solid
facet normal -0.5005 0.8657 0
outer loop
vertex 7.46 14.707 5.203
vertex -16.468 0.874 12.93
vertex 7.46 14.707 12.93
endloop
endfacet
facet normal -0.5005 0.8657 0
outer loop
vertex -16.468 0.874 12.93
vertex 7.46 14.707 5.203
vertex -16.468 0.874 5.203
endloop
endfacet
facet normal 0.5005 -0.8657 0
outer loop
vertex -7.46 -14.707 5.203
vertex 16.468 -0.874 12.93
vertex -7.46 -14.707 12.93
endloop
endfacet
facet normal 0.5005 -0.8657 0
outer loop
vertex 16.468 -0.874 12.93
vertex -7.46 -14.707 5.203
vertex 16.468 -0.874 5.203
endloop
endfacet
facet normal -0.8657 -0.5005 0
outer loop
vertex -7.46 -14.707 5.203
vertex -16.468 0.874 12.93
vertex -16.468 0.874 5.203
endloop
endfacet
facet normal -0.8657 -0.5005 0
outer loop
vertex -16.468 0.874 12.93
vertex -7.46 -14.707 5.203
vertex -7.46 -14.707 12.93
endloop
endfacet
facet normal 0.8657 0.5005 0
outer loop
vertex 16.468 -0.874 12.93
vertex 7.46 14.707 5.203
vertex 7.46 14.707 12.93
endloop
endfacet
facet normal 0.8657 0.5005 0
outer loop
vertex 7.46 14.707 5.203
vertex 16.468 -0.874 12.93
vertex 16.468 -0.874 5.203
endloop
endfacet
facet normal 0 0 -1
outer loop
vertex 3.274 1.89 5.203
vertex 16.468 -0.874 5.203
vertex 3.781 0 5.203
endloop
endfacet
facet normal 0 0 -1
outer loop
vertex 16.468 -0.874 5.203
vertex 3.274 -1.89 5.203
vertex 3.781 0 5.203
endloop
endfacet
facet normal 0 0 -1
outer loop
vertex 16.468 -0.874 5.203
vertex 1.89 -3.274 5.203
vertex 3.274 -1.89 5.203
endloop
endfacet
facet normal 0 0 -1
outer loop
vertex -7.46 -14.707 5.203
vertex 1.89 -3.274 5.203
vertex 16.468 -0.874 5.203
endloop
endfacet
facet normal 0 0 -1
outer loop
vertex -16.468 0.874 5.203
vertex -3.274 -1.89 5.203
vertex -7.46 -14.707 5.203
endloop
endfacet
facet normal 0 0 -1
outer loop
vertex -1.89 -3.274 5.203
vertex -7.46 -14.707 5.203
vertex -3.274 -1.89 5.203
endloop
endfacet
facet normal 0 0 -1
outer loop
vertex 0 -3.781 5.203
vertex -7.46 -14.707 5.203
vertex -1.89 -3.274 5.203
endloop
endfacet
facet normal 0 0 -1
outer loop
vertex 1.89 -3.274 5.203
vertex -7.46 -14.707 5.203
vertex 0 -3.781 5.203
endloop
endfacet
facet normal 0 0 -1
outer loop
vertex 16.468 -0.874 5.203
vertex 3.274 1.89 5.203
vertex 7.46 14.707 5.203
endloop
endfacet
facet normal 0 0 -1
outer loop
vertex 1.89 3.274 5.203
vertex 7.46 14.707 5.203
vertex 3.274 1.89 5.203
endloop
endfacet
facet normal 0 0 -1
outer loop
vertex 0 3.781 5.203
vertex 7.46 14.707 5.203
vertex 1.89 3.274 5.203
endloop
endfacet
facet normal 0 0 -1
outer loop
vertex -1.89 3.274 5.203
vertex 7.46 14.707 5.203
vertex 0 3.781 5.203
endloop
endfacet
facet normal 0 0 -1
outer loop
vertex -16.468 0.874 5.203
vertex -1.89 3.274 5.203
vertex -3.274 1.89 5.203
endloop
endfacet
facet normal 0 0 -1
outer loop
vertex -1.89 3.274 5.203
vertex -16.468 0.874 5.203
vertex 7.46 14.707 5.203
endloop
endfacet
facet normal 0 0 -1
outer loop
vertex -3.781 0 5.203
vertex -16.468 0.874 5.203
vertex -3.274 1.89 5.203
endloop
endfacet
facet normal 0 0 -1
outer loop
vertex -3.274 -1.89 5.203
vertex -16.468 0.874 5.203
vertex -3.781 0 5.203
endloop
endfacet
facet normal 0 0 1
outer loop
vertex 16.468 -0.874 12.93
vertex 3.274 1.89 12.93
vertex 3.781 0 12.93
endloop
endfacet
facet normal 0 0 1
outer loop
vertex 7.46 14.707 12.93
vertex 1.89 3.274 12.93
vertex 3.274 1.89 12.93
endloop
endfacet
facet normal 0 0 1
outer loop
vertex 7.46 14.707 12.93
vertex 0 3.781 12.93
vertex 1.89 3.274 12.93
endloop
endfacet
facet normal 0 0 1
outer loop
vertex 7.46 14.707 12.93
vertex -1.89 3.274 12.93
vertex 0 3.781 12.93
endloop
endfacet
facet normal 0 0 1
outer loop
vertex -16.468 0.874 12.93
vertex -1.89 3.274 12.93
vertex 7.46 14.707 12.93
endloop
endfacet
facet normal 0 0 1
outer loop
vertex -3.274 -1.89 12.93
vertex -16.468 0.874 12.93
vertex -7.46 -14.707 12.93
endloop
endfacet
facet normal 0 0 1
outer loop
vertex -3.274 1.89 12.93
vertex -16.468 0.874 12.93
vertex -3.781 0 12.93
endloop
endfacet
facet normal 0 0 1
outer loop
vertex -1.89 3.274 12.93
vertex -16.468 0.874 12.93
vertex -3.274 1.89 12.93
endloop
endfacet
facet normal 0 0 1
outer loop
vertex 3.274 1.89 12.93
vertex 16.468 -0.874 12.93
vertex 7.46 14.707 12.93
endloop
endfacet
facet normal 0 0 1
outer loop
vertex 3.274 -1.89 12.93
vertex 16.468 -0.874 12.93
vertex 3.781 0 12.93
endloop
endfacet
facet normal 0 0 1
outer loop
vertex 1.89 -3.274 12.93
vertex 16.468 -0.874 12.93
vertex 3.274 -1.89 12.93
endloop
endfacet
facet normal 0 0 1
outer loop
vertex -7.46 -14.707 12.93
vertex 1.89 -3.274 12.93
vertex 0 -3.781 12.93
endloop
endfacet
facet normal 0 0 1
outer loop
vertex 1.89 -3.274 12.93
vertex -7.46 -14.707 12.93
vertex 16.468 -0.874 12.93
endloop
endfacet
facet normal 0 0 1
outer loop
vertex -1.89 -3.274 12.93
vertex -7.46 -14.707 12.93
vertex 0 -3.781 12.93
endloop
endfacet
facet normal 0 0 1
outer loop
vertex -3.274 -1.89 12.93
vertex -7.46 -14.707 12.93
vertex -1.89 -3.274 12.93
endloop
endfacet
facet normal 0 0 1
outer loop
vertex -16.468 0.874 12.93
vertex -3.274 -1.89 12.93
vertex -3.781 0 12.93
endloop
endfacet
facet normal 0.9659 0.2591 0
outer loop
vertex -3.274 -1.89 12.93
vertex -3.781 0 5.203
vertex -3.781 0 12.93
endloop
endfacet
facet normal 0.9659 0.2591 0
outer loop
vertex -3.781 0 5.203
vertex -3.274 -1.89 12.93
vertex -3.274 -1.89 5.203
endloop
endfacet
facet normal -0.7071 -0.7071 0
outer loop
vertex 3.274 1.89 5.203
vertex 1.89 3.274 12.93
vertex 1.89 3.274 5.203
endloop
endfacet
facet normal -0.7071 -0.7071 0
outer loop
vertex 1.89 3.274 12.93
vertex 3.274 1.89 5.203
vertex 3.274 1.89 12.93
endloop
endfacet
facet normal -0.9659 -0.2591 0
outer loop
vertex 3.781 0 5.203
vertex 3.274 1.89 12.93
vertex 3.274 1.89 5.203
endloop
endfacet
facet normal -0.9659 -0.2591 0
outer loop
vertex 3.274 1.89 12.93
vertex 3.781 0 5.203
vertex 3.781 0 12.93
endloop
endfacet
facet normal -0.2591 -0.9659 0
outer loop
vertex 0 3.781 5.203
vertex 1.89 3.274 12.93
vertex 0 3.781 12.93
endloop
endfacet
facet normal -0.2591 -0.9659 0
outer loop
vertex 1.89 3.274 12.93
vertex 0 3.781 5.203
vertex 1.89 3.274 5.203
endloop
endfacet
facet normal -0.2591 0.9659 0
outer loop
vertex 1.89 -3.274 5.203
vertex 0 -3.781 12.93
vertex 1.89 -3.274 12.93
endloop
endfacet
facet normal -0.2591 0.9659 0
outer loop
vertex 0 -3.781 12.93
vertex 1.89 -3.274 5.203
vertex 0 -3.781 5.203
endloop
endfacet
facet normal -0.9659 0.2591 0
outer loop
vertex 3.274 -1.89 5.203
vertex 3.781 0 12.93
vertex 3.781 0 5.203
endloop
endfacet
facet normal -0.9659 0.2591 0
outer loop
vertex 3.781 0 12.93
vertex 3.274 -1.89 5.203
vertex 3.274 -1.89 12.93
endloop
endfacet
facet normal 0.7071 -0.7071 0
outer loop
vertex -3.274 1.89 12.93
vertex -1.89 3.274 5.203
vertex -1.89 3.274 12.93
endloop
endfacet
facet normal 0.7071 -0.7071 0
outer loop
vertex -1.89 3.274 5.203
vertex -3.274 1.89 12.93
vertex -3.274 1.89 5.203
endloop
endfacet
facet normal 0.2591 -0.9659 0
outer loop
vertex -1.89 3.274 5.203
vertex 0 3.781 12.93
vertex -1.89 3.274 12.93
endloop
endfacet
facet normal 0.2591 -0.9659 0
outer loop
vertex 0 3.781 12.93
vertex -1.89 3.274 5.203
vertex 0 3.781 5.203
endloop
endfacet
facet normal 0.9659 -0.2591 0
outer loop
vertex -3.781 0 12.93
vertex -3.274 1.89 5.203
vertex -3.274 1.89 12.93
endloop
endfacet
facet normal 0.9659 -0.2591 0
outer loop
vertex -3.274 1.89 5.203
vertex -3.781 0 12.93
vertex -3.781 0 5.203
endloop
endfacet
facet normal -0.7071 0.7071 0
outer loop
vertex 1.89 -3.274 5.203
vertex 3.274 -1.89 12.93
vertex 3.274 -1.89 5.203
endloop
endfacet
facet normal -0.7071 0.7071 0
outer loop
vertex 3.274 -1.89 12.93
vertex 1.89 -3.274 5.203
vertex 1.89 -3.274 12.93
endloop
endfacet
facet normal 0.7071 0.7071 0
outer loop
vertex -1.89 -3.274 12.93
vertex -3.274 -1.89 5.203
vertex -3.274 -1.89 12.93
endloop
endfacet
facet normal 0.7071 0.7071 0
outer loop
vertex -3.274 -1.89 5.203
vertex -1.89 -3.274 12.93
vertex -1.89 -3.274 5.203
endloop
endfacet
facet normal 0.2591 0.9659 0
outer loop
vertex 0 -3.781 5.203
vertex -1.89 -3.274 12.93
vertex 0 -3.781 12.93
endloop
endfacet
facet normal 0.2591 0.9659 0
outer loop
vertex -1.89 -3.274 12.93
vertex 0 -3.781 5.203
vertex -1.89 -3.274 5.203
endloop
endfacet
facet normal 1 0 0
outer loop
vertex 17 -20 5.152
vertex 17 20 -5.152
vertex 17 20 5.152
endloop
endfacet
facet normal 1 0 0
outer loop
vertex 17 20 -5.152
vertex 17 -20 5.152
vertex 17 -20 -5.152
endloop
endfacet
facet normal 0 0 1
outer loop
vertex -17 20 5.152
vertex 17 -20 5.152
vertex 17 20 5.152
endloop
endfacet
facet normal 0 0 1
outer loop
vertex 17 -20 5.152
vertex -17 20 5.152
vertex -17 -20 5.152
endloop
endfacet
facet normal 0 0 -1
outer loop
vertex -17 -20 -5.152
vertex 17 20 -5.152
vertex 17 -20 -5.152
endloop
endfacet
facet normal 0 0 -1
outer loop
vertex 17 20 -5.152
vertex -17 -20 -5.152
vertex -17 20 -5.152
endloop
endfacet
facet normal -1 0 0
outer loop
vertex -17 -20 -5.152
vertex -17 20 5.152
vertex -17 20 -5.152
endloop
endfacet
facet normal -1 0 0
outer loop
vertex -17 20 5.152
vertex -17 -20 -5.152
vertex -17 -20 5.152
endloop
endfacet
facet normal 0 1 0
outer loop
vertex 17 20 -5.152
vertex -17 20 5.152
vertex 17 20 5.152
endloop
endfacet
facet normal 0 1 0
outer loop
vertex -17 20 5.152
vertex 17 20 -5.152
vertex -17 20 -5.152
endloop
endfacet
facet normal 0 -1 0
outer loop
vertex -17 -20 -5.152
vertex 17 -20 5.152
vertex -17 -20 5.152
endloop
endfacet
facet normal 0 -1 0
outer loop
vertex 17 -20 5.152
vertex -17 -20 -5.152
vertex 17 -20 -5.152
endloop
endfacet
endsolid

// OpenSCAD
difference() {
	translate([0.0,0.0,9.066668343592482]){
	rotate([90,0,-59.96672058105469]){
		cube([17.99765775626607,7.727274156470865,27.6384164373795], center = true);
	}
}

	translate([0.0,0.0,9.066668343592482]){
	cylinder($fn = 12, h = 7.727274156470865, r1 = 3.780931016779804, r2 = 3.780931016779804, center = true);
}
}
translate([0.0,0.0,0.0]){
	rotate([0,-0.0,0]){
		cube([34.0,40.0,10.303030636509869], center = true);
	}
}
